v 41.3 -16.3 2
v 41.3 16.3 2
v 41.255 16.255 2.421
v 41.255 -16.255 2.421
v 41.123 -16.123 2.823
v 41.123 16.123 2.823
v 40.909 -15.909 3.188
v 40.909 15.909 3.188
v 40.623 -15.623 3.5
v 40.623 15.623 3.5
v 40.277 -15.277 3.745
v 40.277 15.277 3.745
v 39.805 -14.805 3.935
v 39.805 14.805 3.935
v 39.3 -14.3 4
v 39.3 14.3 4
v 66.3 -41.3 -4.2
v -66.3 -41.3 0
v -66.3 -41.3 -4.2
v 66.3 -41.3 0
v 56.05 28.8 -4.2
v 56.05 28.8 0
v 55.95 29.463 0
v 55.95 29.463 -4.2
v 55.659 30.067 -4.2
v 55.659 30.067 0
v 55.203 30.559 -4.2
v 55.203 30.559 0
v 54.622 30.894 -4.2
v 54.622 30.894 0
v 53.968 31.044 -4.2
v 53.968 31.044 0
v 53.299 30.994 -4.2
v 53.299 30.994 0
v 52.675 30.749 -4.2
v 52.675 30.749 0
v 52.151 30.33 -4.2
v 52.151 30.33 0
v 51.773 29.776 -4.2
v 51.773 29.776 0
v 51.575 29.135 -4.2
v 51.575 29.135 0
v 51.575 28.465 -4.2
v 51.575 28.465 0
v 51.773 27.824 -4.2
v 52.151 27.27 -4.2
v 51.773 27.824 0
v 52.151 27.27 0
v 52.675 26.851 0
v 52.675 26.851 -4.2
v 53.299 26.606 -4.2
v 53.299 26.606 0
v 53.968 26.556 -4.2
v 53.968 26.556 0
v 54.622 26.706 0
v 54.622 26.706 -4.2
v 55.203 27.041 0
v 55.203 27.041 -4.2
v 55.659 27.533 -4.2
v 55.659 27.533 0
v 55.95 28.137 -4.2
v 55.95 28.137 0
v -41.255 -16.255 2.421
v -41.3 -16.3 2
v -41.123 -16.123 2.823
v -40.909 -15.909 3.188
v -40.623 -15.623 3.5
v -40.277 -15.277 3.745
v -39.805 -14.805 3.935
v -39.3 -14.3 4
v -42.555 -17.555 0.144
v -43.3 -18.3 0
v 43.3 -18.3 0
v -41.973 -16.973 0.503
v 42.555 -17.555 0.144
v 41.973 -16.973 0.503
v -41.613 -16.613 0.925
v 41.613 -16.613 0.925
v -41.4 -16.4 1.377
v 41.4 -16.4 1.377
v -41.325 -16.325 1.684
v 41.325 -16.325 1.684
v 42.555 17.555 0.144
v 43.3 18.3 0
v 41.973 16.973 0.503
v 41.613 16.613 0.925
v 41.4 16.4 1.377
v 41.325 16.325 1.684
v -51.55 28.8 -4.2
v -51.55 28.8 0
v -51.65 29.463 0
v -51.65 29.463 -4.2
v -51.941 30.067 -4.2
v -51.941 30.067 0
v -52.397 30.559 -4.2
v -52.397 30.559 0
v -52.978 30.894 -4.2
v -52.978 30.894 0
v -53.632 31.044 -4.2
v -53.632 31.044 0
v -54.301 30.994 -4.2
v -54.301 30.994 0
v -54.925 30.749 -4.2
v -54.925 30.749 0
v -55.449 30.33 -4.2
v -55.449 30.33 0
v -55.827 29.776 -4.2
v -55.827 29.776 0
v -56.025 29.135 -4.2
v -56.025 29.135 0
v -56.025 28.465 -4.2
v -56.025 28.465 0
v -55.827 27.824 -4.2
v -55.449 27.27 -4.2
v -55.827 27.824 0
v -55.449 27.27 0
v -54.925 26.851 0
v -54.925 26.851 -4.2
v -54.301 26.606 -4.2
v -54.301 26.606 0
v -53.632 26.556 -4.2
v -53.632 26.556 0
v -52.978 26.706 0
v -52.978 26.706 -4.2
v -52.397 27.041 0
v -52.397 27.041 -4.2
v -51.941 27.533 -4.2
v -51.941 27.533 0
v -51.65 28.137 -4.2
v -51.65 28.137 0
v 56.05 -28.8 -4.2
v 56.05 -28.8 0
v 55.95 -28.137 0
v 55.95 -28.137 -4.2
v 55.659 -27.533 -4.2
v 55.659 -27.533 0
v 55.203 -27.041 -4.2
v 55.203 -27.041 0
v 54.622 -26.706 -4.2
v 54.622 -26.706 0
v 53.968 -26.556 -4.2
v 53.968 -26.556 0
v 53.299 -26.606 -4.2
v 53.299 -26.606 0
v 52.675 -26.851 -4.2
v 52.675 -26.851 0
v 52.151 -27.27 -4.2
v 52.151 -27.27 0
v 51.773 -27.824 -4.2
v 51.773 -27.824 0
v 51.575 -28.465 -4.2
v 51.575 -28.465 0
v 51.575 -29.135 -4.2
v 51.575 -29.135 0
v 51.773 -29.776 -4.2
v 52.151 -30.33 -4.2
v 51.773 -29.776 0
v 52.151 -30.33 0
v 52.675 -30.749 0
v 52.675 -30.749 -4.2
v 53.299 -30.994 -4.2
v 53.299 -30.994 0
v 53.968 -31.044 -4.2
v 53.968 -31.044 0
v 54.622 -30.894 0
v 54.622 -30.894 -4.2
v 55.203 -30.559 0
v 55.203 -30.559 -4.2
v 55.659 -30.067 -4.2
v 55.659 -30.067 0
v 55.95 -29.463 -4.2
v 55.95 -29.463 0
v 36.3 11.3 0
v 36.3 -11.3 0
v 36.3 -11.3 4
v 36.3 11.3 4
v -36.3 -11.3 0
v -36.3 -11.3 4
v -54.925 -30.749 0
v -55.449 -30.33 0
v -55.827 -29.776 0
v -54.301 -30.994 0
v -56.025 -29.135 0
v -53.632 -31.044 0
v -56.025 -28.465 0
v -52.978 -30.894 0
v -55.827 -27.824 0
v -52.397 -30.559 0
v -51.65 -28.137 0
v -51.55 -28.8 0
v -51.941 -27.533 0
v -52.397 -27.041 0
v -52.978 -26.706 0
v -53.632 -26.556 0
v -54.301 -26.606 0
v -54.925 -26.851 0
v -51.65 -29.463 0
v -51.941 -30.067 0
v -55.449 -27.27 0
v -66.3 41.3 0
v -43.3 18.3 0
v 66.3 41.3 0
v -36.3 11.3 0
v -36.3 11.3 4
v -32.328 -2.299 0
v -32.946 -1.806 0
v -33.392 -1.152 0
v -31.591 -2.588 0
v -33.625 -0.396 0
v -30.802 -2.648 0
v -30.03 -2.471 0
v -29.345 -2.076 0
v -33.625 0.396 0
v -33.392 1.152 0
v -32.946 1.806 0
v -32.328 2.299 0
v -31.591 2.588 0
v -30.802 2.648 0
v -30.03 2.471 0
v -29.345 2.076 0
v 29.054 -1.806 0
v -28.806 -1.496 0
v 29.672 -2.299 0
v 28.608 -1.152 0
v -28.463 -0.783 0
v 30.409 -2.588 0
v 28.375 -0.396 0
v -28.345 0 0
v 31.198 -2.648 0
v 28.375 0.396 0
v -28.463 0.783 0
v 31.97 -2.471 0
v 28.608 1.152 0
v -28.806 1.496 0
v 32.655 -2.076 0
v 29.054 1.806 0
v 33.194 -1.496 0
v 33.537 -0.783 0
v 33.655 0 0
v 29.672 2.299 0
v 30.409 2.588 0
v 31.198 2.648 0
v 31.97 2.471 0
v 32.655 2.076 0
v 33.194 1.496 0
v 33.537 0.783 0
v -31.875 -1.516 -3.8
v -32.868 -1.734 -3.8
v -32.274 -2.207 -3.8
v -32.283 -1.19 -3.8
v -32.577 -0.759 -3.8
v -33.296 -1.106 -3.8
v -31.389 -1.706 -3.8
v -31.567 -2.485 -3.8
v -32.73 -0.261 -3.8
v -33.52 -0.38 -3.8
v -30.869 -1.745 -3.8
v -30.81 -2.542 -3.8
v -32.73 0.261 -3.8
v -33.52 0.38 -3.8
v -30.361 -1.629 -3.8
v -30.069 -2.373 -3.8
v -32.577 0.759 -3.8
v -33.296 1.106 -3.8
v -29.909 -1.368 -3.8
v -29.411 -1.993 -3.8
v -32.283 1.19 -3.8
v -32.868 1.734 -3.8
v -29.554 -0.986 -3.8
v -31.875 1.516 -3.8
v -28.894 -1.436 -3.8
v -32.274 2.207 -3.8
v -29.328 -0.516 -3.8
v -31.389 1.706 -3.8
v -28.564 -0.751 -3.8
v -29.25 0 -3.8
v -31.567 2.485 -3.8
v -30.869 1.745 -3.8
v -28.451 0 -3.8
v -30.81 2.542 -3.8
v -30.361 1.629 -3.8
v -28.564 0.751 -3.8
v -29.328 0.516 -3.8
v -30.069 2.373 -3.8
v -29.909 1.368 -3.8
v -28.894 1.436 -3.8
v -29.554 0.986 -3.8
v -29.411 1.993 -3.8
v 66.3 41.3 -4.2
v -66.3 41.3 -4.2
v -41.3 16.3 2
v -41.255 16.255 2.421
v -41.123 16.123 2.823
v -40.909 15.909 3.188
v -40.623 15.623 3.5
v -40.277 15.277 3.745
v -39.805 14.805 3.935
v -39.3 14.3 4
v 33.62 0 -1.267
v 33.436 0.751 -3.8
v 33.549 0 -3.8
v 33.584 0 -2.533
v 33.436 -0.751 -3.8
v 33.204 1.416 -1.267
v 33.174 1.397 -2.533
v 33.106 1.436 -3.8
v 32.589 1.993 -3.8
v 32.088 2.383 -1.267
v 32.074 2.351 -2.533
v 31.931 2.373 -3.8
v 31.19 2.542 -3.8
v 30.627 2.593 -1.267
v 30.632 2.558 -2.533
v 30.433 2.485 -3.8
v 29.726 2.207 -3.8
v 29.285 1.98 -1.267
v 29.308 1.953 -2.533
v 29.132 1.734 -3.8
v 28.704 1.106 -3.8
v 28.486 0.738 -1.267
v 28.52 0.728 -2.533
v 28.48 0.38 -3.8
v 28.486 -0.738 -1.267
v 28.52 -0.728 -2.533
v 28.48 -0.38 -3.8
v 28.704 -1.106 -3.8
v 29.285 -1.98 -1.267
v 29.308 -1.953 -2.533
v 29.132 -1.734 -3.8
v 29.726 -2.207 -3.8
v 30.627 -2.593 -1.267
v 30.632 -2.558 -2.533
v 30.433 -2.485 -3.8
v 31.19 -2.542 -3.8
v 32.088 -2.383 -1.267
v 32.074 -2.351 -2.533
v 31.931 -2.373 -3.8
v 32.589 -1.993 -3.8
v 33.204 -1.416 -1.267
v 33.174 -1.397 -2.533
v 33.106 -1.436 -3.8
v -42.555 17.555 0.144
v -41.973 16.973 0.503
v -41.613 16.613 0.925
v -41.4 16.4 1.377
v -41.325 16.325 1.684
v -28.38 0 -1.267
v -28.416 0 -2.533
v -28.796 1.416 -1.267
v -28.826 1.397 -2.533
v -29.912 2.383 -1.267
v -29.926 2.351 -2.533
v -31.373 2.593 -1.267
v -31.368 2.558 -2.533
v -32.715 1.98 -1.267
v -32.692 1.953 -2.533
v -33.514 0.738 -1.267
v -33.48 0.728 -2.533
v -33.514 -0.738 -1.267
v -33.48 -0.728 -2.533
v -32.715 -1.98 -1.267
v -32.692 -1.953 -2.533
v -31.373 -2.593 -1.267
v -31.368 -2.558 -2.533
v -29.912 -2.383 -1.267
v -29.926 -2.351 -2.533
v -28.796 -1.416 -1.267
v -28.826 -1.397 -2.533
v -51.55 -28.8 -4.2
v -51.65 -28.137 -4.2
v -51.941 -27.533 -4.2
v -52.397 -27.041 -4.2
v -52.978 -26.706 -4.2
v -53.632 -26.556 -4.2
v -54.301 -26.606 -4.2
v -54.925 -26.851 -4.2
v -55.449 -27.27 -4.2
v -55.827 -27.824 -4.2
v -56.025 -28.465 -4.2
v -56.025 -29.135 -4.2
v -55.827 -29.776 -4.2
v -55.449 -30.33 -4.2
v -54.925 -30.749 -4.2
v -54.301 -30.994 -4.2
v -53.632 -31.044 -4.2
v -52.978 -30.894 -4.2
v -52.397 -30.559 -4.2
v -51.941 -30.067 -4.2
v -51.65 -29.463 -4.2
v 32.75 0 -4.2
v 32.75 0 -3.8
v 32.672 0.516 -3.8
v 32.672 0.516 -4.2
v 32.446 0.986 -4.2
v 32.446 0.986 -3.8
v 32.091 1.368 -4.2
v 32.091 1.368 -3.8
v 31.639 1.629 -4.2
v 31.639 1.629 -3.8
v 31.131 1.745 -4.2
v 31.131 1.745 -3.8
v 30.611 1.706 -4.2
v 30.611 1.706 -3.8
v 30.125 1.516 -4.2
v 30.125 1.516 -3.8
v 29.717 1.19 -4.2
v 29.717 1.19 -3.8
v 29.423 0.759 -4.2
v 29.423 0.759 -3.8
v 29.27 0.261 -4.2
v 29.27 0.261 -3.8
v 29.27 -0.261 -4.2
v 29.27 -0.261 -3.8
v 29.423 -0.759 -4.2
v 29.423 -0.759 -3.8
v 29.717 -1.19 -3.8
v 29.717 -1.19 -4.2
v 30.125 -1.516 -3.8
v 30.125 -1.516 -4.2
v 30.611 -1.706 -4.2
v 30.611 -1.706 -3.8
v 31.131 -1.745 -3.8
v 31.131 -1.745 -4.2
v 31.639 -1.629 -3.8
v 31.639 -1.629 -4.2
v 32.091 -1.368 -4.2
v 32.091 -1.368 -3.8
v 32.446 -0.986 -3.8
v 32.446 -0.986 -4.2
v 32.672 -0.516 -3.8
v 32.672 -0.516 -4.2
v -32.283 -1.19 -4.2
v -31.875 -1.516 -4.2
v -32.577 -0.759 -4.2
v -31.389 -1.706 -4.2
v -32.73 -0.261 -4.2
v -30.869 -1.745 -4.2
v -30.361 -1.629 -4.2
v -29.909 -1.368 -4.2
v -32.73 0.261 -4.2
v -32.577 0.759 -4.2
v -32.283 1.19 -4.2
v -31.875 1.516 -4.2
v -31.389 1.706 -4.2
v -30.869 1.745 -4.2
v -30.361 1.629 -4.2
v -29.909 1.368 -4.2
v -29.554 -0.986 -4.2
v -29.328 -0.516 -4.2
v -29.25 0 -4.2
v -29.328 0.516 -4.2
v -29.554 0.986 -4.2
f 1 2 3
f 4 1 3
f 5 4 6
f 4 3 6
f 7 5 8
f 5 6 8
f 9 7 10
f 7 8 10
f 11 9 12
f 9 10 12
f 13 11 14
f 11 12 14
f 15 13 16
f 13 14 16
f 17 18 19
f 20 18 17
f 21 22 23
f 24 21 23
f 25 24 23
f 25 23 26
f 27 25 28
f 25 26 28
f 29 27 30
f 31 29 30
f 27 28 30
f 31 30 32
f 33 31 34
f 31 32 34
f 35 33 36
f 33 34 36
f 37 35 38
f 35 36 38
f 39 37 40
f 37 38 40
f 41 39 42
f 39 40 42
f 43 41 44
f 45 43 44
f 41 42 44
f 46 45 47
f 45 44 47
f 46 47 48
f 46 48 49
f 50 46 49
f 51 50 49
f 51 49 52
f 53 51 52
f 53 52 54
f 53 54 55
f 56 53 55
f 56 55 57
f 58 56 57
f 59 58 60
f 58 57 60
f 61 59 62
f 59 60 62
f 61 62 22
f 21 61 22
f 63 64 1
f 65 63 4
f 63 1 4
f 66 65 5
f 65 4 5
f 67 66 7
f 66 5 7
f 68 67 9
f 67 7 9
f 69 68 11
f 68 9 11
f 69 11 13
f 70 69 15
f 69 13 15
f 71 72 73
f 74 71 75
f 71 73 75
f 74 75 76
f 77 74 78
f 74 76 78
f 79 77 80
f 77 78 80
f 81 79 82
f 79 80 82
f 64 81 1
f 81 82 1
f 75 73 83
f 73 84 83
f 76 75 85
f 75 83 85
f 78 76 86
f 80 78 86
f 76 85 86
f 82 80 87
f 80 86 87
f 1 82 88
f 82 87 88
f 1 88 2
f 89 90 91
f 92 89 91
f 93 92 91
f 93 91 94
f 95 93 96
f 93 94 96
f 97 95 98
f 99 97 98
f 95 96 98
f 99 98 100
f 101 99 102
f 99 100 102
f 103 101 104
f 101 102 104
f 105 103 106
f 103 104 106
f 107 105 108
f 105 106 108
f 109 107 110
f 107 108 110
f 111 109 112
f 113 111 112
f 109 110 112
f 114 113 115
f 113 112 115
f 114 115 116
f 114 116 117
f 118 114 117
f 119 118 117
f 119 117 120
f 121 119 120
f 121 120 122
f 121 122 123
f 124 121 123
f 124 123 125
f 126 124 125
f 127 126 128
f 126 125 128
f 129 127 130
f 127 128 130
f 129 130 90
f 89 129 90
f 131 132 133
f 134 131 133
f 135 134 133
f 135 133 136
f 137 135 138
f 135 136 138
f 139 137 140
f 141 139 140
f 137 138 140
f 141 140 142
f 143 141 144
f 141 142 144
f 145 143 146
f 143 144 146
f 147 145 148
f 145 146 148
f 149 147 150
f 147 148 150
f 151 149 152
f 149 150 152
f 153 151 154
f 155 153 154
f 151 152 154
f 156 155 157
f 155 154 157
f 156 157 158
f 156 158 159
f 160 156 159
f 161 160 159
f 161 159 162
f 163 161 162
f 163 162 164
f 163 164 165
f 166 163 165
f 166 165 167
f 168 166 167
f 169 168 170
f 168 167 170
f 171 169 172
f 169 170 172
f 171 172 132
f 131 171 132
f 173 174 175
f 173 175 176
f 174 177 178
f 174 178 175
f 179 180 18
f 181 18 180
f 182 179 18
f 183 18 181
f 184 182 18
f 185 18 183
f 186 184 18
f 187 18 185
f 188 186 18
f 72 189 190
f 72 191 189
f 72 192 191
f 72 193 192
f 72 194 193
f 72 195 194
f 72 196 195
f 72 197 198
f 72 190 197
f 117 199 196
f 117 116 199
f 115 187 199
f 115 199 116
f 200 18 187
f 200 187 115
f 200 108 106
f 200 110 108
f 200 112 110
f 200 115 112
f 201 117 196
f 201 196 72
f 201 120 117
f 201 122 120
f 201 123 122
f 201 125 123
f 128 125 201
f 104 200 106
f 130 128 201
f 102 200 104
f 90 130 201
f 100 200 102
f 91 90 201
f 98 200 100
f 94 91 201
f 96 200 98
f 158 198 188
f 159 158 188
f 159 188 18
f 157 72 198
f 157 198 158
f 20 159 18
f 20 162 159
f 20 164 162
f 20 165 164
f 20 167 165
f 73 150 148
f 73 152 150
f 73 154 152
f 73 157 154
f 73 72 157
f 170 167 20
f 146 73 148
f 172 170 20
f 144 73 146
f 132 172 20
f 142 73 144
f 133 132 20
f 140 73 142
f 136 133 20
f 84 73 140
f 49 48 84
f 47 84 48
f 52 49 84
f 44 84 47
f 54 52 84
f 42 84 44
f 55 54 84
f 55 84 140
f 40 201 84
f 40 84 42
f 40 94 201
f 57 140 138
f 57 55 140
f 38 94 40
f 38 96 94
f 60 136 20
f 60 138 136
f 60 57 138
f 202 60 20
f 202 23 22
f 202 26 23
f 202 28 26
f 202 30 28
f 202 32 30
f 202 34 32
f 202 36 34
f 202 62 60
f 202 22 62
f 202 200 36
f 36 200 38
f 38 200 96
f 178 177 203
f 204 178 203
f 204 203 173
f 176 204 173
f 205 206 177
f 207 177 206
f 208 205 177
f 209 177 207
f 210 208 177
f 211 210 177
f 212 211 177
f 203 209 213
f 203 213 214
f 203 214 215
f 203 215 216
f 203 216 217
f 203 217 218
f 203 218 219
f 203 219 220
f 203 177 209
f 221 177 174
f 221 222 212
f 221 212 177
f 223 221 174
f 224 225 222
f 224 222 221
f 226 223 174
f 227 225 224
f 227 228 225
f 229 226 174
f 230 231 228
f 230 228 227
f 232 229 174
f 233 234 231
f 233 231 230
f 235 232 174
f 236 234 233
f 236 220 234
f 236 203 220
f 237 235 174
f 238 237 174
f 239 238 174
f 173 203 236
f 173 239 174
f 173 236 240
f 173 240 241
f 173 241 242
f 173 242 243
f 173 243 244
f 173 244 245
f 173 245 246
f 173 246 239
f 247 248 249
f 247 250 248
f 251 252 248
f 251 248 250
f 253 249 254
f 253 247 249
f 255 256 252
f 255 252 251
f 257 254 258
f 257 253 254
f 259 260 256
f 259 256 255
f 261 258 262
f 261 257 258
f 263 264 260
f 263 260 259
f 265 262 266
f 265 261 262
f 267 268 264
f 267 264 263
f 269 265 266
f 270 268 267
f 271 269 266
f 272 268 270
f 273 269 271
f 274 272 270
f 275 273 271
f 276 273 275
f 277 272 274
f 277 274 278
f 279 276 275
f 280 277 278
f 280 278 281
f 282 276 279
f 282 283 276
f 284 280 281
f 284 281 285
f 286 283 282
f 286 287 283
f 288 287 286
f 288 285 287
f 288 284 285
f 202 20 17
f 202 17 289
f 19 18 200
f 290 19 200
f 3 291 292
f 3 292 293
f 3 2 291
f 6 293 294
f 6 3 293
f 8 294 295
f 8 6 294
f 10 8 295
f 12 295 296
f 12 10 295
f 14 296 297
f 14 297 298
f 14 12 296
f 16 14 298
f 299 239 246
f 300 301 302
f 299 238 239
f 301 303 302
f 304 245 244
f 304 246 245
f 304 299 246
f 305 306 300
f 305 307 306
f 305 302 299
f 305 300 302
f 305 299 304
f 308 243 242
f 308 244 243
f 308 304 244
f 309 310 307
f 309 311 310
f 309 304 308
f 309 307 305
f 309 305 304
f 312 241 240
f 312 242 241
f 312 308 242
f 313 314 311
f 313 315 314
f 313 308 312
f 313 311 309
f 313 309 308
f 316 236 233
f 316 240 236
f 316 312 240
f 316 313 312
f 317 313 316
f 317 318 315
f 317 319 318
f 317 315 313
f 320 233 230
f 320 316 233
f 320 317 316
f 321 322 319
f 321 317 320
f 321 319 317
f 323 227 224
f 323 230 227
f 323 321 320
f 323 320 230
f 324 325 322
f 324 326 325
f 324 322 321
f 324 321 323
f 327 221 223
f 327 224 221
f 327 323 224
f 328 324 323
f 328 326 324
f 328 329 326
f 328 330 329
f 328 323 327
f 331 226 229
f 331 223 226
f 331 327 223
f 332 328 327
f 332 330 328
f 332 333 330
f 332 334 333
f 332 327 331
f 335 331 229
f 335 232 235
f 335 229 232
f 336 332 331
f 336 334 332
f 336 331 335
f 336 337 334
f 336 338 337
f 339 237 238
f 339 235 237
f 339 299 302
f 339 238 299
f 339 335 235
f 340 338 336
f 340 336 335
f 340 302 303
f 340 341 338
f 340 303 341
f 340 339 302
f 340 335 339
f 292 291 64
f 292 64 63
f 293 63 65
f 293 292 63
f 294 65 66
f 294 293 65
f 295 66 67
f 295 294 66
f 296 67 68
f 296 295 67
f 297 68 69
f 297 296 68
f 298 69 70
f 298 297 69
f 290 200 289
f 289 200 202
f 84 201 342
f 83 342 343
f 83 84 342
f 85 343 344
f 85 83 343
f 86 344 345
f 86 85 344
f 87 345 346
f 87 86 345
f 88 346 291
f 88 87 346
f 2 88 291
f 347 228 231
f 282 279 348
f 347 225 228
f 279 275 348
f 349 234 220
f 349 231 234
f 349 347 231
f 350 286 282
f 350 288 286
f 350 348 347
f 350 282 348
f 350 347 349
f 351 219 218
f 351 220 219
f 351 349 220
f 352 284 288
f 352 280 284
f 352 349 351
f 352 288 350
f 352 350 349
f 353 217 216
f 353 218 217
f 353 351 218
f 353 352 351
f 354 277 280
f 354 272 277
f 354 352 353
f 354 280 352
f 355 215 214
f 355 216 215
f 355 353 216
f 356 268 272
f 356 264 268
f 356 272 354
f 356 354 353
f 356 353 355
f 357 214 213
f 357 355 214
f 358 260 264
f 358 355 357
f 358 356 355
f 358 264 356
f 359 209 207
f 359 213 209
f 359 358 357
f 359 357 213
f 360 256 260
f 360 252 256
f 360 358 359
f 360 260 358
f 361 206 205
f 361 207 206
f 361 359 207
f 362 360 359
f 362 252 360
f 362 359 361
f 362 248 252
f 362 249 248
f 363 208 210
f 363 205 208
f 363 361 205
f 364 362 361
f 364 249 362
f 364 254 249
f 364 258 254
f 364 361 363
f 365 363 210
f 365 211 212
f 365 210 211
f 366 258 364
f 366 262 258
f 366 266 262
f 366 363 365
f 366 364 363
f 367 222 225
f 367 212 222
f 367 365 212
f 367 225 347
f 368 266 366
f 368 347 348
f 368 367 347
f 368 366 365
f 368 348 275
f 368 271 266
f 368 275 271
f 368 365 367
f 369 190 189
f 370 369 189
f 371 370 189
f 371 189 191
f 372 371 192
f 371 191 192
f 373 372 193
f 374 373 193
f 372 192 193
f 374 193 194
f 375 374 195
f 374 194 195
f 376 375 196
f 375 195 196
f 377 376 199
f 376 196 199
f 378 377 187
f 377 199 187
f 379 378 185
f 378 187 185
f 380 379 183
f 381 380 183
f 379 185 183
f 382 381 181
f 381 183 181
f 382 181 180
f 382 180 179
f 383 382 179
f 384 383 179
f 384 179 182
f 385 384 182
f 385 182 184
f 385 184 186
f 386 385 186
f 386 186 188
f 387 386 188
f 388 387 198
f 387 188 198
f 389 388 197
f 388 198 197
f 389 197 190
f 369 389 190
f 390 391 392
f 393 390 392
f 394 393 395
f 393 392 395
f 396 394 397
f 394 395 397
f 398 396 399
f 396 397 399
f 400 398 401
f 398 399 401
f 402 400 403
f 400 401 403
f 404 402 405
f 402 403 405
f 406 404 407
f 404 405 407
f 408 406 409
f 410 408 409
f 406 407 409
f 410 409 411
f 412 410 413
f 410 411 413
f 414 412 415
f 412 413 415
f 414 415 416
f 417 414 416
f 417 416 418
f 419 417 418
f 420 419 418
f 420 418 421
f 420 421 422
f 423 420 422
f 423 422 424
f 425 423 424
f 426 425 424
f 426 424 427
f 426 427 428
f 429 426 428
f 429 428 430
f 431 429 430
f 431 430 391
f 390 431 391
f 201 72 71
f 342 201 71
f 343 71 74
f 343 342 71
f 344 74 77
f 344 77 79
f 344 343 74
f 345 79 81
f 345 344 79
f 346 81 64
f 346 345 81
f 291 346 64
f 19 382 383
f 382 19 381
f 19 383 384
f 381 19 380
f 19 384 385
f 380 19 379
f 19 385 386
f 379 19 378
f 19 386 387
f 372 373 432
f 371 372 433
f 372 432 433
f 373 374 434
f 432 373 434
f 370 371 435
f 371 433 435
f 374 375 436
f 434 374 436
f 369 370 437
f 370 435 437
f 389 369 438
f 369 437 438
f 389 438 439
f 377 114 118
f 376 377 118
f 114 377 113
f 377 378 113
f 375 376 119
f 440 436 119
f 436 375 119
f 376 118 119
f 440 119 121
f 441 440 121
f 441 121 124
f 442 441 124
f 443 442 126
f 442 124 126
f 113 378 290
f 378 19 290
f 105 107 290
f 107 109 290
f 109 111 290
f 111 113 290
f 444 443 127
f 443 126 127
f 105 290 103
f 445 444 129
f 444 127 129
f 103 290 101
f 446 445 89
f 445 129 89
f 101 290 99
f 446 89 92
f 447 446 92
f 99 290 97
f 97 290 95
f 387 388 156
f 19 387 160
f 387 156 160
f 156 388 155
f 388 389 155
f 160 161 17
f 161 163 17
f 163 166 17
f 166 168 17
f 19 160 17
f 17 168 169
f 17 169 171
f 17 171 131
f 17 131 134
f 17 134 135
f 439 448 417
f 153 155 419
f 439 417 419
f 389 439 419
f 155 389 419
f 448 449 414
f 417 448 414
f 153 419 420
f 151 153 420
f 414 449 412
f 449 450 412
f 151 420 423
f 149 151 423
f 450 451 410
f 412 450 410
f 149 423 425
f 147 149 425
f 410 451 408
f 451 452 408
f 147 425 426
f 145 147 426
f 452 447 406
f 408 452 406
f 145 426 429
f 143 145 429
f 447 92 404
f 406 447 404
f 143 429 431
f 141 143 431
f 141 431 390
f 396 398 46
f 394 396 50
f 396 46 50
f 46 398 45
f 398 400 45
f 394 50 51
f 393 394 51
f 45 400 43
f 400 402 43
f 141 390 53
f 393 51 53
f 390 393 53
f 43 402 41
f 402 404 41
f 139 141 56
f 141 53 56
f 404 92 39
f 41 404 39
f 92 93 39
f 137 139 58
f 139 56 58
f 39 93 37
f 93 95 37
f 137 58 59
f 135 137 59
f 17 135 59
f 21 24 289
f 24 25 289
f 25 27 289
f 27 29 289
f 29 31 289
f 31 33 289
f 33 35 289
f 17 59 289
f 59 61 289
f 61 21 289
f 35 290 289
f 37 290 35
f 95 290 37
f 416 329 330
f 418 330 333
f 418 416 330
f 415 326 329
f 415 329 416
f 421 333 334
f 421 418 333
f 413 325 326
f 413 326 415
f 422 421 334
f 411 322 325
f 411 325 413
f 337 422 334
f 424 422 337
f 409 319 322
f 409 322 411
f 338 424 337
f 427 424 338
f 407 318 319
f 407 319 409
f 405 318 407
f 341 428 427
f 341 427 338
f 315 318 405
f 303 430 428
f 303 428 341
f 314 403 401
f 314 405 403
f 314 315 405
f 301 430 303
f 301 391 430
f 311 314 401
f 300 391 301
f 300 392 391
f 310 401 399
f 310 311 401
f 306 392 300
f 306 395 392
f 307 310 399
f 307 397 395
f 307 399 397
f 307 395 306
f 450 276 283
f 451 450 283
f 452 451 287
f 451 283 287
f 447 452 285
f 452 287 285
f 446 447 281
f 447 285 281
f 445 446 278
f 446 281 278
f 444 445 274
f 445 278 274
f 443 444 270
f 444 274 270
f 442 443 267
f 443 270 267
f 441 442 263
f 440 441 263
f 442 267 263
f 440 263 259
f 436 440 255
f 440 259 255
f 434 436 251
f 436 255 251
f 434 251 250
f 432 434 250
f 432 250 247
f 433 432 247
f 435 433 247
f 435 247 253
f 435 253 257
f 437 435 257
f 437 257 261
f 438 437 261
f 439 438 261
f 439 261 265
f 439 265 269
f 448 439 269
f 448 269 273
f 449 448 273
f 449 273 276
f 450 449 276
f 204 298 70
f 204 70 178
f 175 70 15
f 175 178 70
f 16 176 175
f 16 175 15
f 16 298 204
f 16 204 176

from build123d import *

# Parameters (mm, degrees)
F1_W     = 132.6
F1_H     = 82.6
F1_R     = 2.25
F2_DEPTH = 4.2
F0_W     = 82.6
F0_H     = 32.6
F0_W_2   = 72.6
F0_H_2   = 22.6
F3_DEPTH = 4
F4_R     = 2.655
F5_DEPTH = 3.8
F5_TAPER = 1.6
F6_R     = 1.75
F7_DEPTH = 4.201
F8_R     = 1.99999


# Not quite as in the source:
# - a fillet or chamfer is up to 0.001 mm smaller than in the source, because OpenCascade refuses the exact size


with BuildPart() as f2:
    # F1 (on Top) → F2 (new body)
    with BuildSketch(Plane.XY):
        Rectangle(F1_W, F1_H)
        with Locations((-53.8, -28.8)):
            Circle(F1_R, mode=Mode.SUBTRACT)
        with Locations((53.8, -28.8)):
            Circle(F1_R, mode=Mode.SUBTRACT)
        with Locations((-53.8, 28.8)):
            Circle(F1_R, mode=Mode.SUBTRACT)
        with Locations((53.8, 28.8)):
            Circle(F1_R, mode=Mode.SUBTRACT)
    extrude(amount=-F2_DEPTH)

    # F0 (on Top) → F3 (join)
    with BuildSketch(Plane.XY):
        Rectangle(F0_W, F0_H)
        Rectangle(F0_W_2, F0_H_2, mode=Mode.SUBTRACT)
    extrude(amount=F3_DEPTH)

    # F4 (on face) → F5 (cut)
    with BuildSketch(Plane.XY):
        with Locations((-31, 0)):
            Circle(F4_R)
        with Locations((31, 0)):
            Circle(F4_R)
    extrude(amount=-F5_DEPTH, taper=F5_TAPER, mode=Mode.SUBTRACT)

    # F6 (on face) → F7 (cut, through all)
    with BuildSketch(Plane.XY):
        with Locations((31, 0)):
            Circle(F6_R)
        with Locations((-31, 0)):
            Circle(F6_R)
    extrude(amount=-F7_DEPTH, mode=Mode.SUBTRACT)

    # F8 (radius 2 in the source; OpenCascade refuses exactly that, so slightly less here)
    f8_edges = [f2.edges().sort_by_distance(p)[0] for p in [
        (0, 16.3, 0),
        (-41.3, 0, 0),
        (0, -16.3, 0),
        (41.3, 0, 0),
        (0, -16.3, 4),
        (41.3, 0, 4),
        (0, 16.3, 4),
        (-41.3, 0, 4),
    ]]
    fillet(f8_edges, radius=F8_R)


solid = f2.part
